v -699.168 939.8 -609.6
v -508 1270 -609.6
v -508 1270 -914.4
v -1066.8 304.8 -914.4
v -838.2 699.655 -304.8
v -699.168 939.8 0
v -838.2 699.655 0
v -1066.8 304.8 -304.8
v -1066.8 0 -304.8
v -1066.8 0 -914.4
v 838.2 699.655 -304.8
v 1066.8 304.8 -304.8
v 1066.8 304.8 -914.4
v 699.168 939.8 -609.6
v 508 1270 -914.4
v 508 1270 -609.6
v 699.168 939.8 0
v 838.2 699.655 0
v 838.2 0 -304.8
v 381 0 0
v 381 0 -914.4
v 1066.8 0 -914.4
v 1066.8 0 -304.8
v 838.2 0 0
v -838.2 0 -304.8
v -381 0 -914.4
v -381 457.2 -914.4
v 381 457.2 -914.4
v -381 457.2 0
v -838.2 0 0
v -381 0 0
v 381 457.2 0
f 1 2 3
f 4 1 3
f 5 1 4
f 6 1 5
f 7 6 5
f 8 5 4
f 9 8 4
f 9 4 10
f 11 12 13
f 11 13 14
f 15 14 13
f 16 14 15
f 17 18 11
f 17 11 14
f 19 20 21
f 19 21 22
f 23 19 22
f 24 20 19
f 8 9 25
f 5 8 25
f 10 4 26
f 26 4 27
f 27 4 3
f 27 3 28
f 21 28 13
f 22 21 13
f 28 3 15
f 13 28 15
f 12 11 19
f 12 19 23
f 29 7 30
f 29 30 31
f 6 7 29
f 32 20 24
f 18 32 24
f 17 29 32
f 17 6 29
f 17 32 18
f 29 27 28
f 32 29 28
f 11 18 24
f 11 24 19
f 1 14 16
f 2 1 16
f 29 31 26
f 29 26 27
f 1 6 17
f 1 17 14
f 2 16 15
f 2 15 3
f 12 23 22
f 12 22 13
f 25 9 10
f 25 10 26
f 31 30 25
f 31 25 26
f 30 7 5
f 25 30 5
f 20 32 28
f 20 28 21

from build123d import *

# Parameters (mm, degrees)
BOSS_EXTRUDE1_DEPTH     = 914.4
SKETCH2_W               = 228.6
SKETCH2_H               = 304.8
CUT_EXTRUDE1_DEPTH      = 1894.961351242
CUT_EXTRUDE2_DEPTH      = 1894.961351242
CUT_EXTRUDE2_DEPTH_BACK = 1894.961351242
SKETCH3_W               = 609.6
SKETCH3_H               = 330.2


with BuildPart() as part:
    # Sketch1 → Boss-Extrude1 (new body)
    with BuildSketch(Plane.XY):
        Polygon((-381, 0), (-381, 457.2), (381, 457.2), (381, 0), (1066.8, 0), (1066.8, 304.8), (508, 1270), (-508, 1270), (-1066.8, 304.8), (-1066.8, 0), align=None)
    extrude(amount=-BOSS_EXTRUDE1_DEPTH)

    # Sketch2 → Cut-Extrude1 (cut, through all)
    with BuildSketch(Plane(origin=(0, 0, 0), x_dir=(1, 0, 0), z_dir=(0, 1, 0))):
        with Locations((-952.5, 152.4)):
            Rectangle(SKETCH2_W, SKETCH2_H)
        with Locations((952.5, 152.4)):
            Rectangle(SKETCH2_W, SKETCH2_H)
    extrude(amount=CUT_EXTRUDE1_DEPTH, mode=Mode.SUBTRACT)

    # Sketch3 → Cut-Extrude2 (cut, two sides: drawn at the far end of the back side and taken through both)
    with BuildSketch(Plane(origin=(0, 0, 0), x_dir=(0, 0, -1), z_dir=(1, 0, 0)).offset(-CUT_EXTRUDE2_DEPTH_BACK)):
        with Locations((304.8, 1104.9)):
            Rectangle(SKETCH3_W, SKETCH3_H)
    extrude(amount=CUT_EXTRUDE2_DEPTH + CUT_EXTRUDE2_DEPTH_BACK, mode=Mode.SUBTRACT)


solid = part.part
